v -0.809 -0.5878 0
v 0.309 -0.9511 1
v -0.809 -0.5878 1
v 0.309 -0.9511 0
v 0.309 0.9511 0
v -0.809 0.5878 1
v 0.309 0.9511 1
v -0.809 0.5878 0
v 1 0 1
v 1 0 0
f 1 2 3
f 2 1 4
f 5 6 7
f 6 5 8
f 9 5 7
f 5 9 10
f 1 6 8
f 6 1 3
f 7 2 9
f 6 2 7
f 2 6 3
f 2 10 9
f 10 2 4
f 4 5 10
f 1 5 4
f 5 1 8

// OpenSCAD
union(){
     translate([0,0.0,0.0]){ cylinder(1,1,1);}
     translate([0,0.0,0.0]){ cylinder(1,1,1);}
     }
